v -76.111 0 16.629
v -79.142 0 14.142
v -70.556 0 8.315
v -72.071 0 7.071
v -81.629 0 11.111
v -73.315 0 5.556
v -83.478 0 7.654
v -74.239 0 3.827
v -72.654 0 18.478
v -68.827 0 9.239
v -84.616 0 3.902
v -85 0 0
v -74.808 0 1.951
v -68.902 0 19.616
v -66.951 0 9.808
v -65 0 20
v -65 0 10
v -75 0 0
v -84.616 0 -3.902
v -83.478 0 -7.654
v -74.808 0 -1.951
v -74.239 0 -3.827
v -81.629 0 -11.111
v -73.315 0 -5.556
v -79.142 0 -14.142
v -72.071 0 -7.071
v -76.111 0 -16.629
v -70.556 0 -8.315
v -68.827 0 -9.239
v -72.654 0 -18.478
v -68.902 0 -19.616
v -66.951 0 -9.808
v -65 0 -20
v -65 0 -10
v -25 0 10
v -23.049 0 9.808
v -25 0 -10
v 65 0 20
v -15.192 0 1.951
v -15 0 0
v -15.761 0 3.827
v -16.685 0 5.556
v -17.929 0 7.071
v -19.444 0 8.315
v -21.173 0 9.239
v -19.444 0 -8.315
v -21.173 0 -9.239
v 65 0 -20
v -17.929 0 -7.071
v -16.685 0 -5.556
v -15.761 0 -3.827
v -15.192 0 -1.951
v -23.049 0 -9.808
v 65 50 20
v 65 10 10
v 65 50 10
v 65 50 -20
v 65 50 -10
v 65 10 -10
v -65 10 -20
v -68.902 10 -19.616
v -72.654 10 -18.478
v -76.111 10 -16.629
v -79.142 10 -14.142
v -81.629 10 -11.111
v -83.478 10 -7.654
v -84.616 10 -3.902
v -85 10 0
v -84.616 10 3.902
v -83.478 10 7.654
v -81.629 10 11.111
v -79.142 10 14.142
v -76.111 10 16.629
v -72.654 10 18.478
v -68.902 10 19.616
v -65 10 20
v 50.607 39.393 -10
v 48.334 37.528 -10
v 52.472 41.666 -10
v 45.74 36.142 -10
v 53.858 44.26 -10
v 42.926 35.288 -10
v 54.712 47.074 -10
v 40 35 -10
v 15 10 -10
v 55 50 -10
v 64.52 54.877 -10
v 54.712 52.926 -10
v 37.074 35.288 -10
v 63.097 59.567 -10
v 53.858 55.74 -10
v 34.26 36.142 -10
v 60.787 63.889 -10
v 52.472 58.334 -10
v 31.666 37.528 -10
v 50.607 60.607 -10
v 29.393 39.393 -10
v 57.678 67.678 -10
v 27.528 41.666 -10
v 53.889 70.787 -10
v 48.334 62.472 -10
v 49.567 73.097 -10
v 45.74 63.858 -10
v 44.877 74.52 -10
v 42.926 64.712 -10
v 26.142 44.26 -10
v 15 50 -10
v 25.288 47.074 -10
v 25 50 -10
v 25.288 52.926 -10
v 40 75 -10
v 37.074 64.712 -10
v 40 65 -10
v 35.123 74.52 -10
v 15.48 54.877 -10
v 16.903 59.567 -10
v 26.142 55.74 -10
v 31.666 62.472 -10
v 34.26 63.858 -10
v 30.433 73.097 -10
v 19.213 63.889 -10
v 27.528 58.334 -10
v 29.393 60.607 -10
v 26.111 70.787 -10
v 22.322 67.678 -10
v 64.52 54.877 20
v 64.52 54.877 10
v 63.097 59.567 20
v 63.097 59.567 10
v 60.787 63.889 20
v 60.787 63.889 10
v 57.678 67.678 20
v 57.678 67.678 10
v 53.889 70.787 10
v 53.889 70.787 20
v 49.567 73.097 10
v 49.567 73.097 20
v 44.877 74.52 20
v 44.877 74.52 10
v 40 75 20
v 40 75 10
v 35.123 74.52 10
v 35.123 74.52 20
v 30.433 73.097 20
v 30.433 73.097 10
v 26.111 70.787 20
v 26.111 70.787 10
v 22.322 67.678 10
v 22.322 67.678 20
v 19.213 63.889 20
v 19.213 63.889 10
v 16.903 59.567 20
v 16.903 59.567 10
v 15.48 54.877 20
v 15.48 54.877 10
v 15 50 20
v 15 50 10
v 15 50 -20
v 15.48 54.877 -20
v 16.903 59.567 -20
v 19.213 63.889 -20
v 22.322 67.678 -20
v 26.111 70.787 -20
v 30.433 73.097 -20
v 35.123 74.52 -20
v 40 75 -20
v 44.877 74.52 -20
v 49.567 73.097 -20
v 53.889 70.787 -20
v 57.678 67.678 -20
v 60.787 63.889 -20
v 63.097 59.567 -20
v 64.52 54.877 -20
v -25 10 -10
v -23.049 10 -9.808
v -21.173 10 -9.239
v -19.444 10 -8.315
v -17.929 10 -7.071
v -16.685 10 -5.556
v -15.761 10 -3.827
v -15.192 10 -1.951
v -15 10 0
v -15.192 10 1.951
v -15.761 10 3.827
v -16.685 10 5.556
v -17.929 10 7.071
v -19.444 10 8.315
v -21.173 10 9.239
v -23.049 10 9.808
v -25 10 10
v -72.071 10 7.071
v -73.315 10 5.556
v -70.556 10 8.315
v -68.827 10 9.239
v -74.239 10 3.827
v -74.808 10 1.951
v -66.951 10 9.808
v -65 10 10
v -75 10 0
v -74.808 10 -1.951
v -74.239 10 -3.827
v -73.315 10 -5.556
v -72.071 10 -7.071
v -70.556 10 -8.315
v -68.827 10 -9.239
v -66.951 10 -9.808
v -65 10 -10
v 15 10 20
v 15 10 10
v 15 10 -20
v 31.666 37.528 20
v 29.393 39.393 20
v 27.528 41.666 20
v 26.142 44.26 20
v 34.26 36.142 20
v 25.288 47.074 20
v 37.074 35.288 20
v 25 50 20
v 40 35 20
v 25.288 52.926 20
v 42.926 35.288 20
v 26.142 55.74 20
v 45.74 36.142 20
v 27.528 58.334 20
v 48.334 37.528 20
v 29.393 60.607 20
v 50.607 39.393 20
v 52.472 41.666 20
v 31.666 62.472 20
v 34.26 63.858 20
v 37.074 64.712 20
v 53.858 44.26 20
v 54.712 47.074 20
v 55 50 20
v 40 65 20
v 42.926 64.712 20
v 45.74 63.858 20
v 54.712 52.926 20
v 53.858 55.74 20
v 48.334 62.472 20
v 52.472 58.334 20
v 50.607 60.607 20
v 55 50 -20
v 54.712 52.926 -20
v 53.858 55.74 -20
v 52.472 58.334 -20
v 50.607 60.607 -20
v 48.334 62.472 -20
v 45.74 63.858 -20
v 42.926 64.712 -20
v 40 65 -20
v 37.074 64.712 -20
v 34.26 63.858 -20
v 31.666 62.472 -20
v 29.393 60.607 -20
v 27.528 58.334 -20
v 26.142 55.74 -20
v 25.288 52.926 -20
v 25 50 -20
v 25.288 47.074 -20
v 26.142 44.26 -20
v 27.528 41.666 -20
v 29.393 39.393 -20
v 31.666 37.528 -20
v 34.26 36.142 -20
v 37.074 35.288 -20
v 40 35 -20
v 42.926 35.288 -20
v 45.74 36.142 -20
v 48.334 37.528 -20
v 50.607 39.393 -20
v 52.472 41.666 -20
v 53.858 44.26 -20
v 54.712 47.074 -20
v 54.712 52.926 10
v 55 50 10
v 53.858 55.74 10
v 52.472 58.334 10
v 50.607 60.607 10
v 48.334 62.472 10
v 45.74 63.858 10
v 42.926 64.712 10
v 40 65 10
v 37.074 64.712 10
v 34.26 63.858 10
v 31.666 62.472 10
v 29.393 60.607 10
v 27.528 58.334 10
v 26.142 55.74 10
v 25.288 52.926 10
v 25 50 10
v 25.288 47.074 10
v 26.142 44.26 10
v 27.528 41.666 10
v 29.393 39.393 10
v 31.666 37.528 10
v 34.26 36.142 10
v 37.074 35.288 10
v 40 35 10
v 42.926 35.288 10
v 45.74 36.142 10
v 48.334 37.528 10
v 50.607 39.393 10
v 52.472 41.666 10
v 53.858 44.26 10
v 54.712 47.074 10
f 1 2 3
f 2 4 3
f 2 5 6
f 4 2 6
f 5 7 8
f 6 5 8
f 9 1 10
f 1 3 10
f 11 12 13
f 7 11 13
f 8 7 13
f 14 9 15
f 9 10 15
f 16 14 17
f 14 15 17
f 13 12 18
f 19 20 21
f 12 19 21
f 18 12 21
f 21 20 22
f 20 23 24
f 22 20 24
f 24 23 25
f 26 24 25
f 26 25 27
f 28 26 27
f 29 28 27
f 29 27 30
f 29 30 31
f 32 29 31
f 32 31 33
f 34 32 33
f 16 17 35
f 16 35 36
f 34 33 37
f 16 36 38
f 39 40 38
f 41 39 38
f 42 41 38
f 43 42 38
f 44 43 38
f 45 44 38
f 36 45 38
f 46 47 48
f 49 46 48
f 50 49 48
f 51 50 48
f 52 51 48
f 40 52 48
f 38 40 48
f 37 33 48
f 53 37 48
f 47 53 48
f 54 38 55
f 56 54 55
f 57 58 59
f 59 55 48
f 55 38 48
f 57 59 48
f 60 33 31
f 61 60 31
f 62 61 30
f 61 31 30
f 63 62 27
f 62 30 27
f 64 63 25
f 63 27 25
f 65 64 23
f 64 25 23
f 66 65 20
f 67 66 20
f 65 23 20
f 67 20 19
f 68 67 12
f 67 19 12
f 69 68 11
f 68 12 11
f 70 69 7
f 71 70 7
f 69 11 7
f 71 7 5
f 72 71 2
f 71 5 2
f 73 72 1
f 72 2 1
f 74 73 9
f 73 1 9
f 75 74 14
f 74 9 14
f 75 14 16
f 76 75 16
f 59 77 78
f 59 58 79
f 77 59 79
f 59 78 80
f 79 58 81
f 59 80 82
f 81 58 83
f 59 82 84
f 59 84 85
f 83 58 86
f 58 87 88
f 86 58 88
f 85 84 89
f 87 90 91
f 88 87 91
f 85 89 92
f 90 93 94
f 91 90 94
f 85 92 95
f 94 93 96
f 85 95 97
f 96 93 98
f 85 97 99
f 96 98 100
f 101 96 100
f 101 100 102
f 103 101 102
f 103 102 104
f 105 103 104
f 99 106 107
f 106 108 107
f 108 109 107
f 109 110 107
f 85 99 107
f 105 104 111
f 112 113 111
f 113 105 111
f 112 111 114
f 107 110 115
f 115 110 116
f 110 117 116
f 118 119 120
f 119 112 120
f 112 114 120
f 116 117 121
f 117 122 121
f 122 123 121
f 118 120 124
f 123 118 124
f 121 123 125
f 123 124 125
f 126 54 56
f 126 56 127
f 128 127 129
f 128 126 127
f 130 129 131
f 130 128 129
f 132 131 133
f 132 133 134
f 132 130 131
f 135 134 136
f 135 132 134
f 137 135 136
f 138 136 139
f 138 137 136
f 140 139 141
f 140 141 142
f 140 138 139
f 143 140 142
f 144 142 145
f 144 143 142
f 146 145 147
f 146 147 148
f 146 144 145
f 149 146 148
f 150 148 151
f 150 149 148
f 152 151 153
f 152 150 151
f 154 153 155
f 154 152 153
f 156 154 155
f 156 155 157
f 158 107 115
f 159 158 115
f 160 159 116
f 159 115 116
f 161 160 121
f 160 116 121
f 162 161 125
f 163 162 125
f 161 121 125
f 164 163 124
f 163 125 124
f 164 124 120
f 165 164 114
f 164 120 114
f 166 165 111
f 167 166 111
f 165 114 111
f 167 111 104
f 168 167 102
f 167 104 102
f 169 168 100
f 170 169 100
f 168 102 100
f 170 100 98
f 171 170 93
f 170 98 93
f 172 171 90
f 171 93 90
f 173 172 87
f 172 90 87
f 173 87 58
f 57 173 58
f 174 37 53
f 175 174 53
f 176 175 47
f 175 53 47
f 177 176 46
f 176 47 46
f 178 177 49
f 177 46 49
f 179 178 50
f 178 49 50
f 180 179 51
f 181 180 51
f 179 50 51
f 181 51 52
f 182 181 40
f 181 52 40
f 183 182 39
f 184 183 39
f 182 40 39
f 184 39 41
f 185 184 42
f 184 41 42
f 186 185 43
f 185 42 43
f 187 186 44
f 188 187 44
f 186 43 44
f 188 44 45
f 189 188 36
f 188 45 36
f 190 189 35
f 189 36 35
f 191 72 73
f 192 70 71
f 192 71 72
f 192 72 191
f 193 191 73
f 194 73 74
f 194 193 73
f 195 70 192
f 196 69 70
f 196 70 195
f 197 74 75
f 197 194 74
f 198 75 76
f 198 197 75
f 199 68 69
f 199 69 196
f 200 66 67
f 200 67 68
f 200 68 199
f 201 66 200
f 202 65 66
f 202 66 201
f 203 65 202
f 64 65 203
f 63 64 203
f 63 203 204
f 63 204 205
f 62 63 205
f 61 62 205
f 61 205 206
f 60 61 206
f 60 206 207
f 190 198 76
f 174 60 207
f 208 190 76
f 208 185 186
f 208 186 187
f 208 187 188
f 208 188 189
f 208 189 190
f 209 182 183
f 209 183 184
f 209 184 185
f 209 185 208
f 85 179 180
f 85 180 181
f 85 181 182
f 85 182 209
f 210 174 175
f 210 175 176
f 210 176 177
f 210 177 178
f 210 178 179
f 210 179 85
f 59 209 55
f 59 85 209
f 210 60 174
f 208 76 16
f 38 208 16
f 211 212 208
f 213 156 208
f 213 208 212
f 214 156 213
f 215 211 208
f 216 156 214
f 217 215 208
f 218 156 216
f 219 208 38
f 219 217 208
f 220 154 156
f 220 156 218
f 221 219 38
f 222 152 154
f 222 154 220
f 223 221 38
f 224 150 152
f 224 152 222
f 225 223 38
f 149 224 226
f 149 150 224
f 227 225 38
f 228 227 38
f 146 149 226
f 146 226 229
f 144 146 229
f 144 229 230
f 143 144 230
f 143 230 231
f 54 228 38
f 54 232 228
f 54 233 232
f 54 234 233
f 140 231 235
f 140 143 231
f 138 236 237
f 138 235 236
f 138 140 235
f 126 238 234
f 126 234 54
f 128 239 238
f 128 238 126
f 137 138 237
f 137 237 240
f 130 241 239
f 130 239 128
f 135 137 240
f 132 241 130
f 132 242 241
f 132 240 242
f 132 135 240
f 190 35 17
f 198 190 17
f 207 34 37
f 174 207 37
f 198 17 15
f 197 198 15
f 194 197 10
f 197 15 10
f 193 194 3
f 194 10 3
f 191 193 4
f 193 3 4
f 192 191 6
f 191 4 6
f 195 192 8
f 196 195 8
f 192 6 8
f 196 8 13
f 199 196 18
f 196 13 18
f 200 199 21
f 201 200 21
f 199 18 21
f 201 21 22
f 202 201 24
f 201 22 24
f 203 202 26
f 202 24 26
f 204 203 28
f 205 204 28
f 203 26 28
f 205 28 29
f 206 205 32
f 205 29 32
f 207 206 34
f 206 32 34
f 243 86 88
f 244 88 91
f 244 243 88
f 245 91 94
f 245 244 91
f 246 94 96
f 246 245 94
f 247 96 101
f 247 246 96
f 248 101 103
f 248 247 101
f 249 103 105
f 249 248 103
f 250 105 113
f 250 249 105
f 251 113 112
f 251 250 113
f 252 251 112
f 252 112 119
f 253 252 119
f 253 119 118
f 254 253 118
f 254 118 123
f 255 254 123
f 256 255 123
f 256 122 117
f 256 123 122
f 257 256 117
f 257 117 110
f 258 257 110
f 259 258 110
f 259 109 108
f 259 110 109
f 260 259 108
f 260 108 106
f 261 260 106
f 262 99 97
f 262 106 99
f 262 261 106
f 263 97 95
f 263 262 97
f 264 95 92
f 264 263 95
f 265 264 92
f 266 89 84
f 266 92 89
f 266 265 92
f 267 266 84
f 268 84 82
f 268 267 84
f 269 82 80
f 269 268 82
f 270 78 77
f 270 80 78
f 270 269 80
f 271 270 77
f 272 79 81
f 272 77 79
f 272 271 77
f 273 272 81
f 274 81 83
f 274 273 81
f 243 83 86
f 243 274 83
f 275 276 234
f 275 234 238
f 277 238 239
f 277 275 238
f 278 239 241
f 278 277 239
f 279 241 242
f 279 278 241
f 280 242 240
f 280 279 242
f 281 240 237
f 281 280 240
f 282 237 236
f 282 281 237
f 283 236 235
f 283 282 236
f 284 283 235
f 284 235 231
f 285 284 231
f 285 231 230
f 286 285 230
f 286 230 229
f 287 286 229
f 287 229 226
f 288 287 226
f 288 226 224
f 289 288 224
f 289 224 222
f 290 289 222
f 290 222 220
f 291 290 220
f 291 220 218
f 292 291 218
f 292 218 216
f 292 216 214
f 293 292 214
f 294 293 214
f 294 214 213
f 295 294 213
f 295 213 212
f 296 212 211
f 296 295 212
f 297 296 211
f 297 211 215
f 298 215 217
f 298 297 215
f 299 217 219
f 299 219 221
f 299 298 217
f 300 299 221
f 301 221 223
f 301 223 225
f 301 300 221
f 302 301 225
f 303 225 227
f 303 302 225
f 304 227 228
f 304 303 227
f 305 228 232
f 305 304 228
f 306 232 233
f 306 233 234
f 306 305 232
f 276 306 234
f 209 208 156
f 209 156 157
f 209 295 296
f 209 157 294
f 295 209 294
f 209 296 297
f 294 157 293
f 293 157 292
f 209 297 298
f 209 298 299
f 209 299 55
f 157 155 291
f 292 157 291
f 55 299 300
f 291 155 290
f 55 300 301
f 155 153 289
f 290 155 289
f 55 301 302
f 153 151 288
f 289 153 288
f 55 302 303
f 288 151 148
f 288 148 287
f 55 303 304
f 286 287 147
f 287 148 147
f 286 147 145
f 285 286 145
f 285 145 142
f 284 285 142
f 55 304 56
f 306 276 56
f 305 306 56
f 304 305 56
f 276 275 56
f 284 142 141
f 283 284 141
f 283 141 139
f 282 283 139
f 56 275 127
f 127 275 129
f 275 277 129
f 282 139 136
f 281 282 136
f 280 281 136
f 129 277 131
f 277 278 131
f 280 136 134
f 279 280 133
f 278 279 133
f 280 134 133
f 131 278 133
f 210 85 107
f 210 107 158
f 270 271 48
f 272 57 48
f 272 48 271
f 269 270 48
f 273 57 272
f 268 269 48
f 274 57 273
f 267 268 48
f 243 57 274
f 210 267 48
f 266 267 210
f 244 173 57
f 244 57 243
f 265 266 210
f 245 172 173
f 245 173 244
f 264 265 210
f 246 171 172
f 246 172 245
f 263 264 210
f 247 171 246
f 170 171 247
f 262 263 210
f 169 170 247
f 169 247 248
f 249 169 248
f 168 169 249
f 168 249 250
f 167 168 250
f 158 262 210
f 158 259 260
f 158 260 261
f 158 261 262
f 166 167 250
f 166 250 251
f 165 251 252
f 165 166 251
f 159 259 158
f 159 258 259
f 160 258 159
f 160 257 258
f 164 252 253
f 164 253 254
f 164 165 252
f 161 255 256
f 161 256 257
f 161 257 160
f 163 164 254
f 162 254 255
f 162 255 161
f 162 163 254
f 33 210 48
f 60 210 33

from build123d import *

# Parameters (mm, degrees)
BOSS_EXTRUDE1_DEPTH      = 10
BOSS_EXTRUDE2_DEPTH      = 40
BOSS_EXTRUDE2_DEPTH_BACK = 10
SKETCH2_W                = 50
SKETCH2_H                = 10
SKETCH3_R                = 25
BOSS_EXTRUDE3_DEPTH      = 10
BOSS_EXTRUDE4_START      = -10
SKETCH4_R                = 25
BOSS_EXTRUDE4_DEPTH      = 10
CUT_EXTRUDE1_START       = -40
SKETCH5_R                = 15
CUT_EXTRUDE1_DEPTH       = 40


with BuildPart() as part:
    # Sketch1 → Boss-Extrude1 (new body)
    with BuildSketch(Plane(origin=(0, 0, 0), x_dir=(1, 0, 0), z_dir=(0, 1, 0))):
        with BuildLine():
            Line((15, 20), (-65, 20))
            ThreePointArc((-65, 20), (-85, 0), (-65, -20))
            Line((-65, -20), (15, -20))
            Line((15, -20), (15, -10))
            Line((15, -10), (65, -10))
            Line((65, -10), (65, 10))
            Line((65, 10), (15, 10))
            Line((15, 10), (15, 20))
        make_face()
        with BuildLine():
            ThreePointArc((-25, 10), (-15, 0), (-25, -10))
            Line((-25, -10), (-65, -10))
            ThreePointArc((-65, -10), (-75, 0), (-65, 10))
            Line((-65, 10), (-25, 10))
        make_face(mode=Mode.SUBTRACT)
    extrude(amount=BOSS_EXTRUDE1_DEPTH)

    # Sketch2 → Boss-Extrude2 (add, two sides: drawn at the far end of the back side and taken through both)
    with BuildSketch(Plane(origin=(0, 10, 0), x_dir=(1, 0, 0), z_dir=(0, 1, 0)).offset(-BOSS_EXTRUDE2_DEPTH_BACK)):
        with Locations((40, -15)):
            Rectangle(SKETCH2_W, SKETCH2_H)
        with Locations((40, 15)):
            Rectangle(SKETCH2_W, SKETCH2_H)
    extrude(amount=BOSS_EXTRUDE2_DEPTH + BOSS_EXTRUDE2_DEPTH_BACK)

    # Sketch3 → Boss-Extrude3 (add)
    with BuildSketch(Plane.XY.offset(20)):
        with Locations((40, 50)):
            Circle(SKETCH3_R)
    extrude(amount=-BOSS_EXTRUDE3_DEPTH)

    # Sketch4 → Boss-Extrude4 (add)
    with BuildSketch(Plane(origin=(0, 0, -20), x_dir=(-1, 0, 0), z_dir=(0, 0, -1)).offset(BOSS_EXTRUDE4_START)):
        with Locations((-40, 50)):
            Circle(SKETCH4_R)
    extrude(amount=BOSS_EXTRUDE4_DEPTH)

    # Sketch5 → Cut-Extrude1 (cut)
    with BuildSketch(Plane.XY.offset(20).offset(CUT_EXTRUDE1_START)):
        with Locations((40, 50)):
            Circle(SKETCH5_R)
    extrude(amount=CUT_EXTRUDE1_DEPTH, mode=Mode.SUBTRACT)


solid = part.part
